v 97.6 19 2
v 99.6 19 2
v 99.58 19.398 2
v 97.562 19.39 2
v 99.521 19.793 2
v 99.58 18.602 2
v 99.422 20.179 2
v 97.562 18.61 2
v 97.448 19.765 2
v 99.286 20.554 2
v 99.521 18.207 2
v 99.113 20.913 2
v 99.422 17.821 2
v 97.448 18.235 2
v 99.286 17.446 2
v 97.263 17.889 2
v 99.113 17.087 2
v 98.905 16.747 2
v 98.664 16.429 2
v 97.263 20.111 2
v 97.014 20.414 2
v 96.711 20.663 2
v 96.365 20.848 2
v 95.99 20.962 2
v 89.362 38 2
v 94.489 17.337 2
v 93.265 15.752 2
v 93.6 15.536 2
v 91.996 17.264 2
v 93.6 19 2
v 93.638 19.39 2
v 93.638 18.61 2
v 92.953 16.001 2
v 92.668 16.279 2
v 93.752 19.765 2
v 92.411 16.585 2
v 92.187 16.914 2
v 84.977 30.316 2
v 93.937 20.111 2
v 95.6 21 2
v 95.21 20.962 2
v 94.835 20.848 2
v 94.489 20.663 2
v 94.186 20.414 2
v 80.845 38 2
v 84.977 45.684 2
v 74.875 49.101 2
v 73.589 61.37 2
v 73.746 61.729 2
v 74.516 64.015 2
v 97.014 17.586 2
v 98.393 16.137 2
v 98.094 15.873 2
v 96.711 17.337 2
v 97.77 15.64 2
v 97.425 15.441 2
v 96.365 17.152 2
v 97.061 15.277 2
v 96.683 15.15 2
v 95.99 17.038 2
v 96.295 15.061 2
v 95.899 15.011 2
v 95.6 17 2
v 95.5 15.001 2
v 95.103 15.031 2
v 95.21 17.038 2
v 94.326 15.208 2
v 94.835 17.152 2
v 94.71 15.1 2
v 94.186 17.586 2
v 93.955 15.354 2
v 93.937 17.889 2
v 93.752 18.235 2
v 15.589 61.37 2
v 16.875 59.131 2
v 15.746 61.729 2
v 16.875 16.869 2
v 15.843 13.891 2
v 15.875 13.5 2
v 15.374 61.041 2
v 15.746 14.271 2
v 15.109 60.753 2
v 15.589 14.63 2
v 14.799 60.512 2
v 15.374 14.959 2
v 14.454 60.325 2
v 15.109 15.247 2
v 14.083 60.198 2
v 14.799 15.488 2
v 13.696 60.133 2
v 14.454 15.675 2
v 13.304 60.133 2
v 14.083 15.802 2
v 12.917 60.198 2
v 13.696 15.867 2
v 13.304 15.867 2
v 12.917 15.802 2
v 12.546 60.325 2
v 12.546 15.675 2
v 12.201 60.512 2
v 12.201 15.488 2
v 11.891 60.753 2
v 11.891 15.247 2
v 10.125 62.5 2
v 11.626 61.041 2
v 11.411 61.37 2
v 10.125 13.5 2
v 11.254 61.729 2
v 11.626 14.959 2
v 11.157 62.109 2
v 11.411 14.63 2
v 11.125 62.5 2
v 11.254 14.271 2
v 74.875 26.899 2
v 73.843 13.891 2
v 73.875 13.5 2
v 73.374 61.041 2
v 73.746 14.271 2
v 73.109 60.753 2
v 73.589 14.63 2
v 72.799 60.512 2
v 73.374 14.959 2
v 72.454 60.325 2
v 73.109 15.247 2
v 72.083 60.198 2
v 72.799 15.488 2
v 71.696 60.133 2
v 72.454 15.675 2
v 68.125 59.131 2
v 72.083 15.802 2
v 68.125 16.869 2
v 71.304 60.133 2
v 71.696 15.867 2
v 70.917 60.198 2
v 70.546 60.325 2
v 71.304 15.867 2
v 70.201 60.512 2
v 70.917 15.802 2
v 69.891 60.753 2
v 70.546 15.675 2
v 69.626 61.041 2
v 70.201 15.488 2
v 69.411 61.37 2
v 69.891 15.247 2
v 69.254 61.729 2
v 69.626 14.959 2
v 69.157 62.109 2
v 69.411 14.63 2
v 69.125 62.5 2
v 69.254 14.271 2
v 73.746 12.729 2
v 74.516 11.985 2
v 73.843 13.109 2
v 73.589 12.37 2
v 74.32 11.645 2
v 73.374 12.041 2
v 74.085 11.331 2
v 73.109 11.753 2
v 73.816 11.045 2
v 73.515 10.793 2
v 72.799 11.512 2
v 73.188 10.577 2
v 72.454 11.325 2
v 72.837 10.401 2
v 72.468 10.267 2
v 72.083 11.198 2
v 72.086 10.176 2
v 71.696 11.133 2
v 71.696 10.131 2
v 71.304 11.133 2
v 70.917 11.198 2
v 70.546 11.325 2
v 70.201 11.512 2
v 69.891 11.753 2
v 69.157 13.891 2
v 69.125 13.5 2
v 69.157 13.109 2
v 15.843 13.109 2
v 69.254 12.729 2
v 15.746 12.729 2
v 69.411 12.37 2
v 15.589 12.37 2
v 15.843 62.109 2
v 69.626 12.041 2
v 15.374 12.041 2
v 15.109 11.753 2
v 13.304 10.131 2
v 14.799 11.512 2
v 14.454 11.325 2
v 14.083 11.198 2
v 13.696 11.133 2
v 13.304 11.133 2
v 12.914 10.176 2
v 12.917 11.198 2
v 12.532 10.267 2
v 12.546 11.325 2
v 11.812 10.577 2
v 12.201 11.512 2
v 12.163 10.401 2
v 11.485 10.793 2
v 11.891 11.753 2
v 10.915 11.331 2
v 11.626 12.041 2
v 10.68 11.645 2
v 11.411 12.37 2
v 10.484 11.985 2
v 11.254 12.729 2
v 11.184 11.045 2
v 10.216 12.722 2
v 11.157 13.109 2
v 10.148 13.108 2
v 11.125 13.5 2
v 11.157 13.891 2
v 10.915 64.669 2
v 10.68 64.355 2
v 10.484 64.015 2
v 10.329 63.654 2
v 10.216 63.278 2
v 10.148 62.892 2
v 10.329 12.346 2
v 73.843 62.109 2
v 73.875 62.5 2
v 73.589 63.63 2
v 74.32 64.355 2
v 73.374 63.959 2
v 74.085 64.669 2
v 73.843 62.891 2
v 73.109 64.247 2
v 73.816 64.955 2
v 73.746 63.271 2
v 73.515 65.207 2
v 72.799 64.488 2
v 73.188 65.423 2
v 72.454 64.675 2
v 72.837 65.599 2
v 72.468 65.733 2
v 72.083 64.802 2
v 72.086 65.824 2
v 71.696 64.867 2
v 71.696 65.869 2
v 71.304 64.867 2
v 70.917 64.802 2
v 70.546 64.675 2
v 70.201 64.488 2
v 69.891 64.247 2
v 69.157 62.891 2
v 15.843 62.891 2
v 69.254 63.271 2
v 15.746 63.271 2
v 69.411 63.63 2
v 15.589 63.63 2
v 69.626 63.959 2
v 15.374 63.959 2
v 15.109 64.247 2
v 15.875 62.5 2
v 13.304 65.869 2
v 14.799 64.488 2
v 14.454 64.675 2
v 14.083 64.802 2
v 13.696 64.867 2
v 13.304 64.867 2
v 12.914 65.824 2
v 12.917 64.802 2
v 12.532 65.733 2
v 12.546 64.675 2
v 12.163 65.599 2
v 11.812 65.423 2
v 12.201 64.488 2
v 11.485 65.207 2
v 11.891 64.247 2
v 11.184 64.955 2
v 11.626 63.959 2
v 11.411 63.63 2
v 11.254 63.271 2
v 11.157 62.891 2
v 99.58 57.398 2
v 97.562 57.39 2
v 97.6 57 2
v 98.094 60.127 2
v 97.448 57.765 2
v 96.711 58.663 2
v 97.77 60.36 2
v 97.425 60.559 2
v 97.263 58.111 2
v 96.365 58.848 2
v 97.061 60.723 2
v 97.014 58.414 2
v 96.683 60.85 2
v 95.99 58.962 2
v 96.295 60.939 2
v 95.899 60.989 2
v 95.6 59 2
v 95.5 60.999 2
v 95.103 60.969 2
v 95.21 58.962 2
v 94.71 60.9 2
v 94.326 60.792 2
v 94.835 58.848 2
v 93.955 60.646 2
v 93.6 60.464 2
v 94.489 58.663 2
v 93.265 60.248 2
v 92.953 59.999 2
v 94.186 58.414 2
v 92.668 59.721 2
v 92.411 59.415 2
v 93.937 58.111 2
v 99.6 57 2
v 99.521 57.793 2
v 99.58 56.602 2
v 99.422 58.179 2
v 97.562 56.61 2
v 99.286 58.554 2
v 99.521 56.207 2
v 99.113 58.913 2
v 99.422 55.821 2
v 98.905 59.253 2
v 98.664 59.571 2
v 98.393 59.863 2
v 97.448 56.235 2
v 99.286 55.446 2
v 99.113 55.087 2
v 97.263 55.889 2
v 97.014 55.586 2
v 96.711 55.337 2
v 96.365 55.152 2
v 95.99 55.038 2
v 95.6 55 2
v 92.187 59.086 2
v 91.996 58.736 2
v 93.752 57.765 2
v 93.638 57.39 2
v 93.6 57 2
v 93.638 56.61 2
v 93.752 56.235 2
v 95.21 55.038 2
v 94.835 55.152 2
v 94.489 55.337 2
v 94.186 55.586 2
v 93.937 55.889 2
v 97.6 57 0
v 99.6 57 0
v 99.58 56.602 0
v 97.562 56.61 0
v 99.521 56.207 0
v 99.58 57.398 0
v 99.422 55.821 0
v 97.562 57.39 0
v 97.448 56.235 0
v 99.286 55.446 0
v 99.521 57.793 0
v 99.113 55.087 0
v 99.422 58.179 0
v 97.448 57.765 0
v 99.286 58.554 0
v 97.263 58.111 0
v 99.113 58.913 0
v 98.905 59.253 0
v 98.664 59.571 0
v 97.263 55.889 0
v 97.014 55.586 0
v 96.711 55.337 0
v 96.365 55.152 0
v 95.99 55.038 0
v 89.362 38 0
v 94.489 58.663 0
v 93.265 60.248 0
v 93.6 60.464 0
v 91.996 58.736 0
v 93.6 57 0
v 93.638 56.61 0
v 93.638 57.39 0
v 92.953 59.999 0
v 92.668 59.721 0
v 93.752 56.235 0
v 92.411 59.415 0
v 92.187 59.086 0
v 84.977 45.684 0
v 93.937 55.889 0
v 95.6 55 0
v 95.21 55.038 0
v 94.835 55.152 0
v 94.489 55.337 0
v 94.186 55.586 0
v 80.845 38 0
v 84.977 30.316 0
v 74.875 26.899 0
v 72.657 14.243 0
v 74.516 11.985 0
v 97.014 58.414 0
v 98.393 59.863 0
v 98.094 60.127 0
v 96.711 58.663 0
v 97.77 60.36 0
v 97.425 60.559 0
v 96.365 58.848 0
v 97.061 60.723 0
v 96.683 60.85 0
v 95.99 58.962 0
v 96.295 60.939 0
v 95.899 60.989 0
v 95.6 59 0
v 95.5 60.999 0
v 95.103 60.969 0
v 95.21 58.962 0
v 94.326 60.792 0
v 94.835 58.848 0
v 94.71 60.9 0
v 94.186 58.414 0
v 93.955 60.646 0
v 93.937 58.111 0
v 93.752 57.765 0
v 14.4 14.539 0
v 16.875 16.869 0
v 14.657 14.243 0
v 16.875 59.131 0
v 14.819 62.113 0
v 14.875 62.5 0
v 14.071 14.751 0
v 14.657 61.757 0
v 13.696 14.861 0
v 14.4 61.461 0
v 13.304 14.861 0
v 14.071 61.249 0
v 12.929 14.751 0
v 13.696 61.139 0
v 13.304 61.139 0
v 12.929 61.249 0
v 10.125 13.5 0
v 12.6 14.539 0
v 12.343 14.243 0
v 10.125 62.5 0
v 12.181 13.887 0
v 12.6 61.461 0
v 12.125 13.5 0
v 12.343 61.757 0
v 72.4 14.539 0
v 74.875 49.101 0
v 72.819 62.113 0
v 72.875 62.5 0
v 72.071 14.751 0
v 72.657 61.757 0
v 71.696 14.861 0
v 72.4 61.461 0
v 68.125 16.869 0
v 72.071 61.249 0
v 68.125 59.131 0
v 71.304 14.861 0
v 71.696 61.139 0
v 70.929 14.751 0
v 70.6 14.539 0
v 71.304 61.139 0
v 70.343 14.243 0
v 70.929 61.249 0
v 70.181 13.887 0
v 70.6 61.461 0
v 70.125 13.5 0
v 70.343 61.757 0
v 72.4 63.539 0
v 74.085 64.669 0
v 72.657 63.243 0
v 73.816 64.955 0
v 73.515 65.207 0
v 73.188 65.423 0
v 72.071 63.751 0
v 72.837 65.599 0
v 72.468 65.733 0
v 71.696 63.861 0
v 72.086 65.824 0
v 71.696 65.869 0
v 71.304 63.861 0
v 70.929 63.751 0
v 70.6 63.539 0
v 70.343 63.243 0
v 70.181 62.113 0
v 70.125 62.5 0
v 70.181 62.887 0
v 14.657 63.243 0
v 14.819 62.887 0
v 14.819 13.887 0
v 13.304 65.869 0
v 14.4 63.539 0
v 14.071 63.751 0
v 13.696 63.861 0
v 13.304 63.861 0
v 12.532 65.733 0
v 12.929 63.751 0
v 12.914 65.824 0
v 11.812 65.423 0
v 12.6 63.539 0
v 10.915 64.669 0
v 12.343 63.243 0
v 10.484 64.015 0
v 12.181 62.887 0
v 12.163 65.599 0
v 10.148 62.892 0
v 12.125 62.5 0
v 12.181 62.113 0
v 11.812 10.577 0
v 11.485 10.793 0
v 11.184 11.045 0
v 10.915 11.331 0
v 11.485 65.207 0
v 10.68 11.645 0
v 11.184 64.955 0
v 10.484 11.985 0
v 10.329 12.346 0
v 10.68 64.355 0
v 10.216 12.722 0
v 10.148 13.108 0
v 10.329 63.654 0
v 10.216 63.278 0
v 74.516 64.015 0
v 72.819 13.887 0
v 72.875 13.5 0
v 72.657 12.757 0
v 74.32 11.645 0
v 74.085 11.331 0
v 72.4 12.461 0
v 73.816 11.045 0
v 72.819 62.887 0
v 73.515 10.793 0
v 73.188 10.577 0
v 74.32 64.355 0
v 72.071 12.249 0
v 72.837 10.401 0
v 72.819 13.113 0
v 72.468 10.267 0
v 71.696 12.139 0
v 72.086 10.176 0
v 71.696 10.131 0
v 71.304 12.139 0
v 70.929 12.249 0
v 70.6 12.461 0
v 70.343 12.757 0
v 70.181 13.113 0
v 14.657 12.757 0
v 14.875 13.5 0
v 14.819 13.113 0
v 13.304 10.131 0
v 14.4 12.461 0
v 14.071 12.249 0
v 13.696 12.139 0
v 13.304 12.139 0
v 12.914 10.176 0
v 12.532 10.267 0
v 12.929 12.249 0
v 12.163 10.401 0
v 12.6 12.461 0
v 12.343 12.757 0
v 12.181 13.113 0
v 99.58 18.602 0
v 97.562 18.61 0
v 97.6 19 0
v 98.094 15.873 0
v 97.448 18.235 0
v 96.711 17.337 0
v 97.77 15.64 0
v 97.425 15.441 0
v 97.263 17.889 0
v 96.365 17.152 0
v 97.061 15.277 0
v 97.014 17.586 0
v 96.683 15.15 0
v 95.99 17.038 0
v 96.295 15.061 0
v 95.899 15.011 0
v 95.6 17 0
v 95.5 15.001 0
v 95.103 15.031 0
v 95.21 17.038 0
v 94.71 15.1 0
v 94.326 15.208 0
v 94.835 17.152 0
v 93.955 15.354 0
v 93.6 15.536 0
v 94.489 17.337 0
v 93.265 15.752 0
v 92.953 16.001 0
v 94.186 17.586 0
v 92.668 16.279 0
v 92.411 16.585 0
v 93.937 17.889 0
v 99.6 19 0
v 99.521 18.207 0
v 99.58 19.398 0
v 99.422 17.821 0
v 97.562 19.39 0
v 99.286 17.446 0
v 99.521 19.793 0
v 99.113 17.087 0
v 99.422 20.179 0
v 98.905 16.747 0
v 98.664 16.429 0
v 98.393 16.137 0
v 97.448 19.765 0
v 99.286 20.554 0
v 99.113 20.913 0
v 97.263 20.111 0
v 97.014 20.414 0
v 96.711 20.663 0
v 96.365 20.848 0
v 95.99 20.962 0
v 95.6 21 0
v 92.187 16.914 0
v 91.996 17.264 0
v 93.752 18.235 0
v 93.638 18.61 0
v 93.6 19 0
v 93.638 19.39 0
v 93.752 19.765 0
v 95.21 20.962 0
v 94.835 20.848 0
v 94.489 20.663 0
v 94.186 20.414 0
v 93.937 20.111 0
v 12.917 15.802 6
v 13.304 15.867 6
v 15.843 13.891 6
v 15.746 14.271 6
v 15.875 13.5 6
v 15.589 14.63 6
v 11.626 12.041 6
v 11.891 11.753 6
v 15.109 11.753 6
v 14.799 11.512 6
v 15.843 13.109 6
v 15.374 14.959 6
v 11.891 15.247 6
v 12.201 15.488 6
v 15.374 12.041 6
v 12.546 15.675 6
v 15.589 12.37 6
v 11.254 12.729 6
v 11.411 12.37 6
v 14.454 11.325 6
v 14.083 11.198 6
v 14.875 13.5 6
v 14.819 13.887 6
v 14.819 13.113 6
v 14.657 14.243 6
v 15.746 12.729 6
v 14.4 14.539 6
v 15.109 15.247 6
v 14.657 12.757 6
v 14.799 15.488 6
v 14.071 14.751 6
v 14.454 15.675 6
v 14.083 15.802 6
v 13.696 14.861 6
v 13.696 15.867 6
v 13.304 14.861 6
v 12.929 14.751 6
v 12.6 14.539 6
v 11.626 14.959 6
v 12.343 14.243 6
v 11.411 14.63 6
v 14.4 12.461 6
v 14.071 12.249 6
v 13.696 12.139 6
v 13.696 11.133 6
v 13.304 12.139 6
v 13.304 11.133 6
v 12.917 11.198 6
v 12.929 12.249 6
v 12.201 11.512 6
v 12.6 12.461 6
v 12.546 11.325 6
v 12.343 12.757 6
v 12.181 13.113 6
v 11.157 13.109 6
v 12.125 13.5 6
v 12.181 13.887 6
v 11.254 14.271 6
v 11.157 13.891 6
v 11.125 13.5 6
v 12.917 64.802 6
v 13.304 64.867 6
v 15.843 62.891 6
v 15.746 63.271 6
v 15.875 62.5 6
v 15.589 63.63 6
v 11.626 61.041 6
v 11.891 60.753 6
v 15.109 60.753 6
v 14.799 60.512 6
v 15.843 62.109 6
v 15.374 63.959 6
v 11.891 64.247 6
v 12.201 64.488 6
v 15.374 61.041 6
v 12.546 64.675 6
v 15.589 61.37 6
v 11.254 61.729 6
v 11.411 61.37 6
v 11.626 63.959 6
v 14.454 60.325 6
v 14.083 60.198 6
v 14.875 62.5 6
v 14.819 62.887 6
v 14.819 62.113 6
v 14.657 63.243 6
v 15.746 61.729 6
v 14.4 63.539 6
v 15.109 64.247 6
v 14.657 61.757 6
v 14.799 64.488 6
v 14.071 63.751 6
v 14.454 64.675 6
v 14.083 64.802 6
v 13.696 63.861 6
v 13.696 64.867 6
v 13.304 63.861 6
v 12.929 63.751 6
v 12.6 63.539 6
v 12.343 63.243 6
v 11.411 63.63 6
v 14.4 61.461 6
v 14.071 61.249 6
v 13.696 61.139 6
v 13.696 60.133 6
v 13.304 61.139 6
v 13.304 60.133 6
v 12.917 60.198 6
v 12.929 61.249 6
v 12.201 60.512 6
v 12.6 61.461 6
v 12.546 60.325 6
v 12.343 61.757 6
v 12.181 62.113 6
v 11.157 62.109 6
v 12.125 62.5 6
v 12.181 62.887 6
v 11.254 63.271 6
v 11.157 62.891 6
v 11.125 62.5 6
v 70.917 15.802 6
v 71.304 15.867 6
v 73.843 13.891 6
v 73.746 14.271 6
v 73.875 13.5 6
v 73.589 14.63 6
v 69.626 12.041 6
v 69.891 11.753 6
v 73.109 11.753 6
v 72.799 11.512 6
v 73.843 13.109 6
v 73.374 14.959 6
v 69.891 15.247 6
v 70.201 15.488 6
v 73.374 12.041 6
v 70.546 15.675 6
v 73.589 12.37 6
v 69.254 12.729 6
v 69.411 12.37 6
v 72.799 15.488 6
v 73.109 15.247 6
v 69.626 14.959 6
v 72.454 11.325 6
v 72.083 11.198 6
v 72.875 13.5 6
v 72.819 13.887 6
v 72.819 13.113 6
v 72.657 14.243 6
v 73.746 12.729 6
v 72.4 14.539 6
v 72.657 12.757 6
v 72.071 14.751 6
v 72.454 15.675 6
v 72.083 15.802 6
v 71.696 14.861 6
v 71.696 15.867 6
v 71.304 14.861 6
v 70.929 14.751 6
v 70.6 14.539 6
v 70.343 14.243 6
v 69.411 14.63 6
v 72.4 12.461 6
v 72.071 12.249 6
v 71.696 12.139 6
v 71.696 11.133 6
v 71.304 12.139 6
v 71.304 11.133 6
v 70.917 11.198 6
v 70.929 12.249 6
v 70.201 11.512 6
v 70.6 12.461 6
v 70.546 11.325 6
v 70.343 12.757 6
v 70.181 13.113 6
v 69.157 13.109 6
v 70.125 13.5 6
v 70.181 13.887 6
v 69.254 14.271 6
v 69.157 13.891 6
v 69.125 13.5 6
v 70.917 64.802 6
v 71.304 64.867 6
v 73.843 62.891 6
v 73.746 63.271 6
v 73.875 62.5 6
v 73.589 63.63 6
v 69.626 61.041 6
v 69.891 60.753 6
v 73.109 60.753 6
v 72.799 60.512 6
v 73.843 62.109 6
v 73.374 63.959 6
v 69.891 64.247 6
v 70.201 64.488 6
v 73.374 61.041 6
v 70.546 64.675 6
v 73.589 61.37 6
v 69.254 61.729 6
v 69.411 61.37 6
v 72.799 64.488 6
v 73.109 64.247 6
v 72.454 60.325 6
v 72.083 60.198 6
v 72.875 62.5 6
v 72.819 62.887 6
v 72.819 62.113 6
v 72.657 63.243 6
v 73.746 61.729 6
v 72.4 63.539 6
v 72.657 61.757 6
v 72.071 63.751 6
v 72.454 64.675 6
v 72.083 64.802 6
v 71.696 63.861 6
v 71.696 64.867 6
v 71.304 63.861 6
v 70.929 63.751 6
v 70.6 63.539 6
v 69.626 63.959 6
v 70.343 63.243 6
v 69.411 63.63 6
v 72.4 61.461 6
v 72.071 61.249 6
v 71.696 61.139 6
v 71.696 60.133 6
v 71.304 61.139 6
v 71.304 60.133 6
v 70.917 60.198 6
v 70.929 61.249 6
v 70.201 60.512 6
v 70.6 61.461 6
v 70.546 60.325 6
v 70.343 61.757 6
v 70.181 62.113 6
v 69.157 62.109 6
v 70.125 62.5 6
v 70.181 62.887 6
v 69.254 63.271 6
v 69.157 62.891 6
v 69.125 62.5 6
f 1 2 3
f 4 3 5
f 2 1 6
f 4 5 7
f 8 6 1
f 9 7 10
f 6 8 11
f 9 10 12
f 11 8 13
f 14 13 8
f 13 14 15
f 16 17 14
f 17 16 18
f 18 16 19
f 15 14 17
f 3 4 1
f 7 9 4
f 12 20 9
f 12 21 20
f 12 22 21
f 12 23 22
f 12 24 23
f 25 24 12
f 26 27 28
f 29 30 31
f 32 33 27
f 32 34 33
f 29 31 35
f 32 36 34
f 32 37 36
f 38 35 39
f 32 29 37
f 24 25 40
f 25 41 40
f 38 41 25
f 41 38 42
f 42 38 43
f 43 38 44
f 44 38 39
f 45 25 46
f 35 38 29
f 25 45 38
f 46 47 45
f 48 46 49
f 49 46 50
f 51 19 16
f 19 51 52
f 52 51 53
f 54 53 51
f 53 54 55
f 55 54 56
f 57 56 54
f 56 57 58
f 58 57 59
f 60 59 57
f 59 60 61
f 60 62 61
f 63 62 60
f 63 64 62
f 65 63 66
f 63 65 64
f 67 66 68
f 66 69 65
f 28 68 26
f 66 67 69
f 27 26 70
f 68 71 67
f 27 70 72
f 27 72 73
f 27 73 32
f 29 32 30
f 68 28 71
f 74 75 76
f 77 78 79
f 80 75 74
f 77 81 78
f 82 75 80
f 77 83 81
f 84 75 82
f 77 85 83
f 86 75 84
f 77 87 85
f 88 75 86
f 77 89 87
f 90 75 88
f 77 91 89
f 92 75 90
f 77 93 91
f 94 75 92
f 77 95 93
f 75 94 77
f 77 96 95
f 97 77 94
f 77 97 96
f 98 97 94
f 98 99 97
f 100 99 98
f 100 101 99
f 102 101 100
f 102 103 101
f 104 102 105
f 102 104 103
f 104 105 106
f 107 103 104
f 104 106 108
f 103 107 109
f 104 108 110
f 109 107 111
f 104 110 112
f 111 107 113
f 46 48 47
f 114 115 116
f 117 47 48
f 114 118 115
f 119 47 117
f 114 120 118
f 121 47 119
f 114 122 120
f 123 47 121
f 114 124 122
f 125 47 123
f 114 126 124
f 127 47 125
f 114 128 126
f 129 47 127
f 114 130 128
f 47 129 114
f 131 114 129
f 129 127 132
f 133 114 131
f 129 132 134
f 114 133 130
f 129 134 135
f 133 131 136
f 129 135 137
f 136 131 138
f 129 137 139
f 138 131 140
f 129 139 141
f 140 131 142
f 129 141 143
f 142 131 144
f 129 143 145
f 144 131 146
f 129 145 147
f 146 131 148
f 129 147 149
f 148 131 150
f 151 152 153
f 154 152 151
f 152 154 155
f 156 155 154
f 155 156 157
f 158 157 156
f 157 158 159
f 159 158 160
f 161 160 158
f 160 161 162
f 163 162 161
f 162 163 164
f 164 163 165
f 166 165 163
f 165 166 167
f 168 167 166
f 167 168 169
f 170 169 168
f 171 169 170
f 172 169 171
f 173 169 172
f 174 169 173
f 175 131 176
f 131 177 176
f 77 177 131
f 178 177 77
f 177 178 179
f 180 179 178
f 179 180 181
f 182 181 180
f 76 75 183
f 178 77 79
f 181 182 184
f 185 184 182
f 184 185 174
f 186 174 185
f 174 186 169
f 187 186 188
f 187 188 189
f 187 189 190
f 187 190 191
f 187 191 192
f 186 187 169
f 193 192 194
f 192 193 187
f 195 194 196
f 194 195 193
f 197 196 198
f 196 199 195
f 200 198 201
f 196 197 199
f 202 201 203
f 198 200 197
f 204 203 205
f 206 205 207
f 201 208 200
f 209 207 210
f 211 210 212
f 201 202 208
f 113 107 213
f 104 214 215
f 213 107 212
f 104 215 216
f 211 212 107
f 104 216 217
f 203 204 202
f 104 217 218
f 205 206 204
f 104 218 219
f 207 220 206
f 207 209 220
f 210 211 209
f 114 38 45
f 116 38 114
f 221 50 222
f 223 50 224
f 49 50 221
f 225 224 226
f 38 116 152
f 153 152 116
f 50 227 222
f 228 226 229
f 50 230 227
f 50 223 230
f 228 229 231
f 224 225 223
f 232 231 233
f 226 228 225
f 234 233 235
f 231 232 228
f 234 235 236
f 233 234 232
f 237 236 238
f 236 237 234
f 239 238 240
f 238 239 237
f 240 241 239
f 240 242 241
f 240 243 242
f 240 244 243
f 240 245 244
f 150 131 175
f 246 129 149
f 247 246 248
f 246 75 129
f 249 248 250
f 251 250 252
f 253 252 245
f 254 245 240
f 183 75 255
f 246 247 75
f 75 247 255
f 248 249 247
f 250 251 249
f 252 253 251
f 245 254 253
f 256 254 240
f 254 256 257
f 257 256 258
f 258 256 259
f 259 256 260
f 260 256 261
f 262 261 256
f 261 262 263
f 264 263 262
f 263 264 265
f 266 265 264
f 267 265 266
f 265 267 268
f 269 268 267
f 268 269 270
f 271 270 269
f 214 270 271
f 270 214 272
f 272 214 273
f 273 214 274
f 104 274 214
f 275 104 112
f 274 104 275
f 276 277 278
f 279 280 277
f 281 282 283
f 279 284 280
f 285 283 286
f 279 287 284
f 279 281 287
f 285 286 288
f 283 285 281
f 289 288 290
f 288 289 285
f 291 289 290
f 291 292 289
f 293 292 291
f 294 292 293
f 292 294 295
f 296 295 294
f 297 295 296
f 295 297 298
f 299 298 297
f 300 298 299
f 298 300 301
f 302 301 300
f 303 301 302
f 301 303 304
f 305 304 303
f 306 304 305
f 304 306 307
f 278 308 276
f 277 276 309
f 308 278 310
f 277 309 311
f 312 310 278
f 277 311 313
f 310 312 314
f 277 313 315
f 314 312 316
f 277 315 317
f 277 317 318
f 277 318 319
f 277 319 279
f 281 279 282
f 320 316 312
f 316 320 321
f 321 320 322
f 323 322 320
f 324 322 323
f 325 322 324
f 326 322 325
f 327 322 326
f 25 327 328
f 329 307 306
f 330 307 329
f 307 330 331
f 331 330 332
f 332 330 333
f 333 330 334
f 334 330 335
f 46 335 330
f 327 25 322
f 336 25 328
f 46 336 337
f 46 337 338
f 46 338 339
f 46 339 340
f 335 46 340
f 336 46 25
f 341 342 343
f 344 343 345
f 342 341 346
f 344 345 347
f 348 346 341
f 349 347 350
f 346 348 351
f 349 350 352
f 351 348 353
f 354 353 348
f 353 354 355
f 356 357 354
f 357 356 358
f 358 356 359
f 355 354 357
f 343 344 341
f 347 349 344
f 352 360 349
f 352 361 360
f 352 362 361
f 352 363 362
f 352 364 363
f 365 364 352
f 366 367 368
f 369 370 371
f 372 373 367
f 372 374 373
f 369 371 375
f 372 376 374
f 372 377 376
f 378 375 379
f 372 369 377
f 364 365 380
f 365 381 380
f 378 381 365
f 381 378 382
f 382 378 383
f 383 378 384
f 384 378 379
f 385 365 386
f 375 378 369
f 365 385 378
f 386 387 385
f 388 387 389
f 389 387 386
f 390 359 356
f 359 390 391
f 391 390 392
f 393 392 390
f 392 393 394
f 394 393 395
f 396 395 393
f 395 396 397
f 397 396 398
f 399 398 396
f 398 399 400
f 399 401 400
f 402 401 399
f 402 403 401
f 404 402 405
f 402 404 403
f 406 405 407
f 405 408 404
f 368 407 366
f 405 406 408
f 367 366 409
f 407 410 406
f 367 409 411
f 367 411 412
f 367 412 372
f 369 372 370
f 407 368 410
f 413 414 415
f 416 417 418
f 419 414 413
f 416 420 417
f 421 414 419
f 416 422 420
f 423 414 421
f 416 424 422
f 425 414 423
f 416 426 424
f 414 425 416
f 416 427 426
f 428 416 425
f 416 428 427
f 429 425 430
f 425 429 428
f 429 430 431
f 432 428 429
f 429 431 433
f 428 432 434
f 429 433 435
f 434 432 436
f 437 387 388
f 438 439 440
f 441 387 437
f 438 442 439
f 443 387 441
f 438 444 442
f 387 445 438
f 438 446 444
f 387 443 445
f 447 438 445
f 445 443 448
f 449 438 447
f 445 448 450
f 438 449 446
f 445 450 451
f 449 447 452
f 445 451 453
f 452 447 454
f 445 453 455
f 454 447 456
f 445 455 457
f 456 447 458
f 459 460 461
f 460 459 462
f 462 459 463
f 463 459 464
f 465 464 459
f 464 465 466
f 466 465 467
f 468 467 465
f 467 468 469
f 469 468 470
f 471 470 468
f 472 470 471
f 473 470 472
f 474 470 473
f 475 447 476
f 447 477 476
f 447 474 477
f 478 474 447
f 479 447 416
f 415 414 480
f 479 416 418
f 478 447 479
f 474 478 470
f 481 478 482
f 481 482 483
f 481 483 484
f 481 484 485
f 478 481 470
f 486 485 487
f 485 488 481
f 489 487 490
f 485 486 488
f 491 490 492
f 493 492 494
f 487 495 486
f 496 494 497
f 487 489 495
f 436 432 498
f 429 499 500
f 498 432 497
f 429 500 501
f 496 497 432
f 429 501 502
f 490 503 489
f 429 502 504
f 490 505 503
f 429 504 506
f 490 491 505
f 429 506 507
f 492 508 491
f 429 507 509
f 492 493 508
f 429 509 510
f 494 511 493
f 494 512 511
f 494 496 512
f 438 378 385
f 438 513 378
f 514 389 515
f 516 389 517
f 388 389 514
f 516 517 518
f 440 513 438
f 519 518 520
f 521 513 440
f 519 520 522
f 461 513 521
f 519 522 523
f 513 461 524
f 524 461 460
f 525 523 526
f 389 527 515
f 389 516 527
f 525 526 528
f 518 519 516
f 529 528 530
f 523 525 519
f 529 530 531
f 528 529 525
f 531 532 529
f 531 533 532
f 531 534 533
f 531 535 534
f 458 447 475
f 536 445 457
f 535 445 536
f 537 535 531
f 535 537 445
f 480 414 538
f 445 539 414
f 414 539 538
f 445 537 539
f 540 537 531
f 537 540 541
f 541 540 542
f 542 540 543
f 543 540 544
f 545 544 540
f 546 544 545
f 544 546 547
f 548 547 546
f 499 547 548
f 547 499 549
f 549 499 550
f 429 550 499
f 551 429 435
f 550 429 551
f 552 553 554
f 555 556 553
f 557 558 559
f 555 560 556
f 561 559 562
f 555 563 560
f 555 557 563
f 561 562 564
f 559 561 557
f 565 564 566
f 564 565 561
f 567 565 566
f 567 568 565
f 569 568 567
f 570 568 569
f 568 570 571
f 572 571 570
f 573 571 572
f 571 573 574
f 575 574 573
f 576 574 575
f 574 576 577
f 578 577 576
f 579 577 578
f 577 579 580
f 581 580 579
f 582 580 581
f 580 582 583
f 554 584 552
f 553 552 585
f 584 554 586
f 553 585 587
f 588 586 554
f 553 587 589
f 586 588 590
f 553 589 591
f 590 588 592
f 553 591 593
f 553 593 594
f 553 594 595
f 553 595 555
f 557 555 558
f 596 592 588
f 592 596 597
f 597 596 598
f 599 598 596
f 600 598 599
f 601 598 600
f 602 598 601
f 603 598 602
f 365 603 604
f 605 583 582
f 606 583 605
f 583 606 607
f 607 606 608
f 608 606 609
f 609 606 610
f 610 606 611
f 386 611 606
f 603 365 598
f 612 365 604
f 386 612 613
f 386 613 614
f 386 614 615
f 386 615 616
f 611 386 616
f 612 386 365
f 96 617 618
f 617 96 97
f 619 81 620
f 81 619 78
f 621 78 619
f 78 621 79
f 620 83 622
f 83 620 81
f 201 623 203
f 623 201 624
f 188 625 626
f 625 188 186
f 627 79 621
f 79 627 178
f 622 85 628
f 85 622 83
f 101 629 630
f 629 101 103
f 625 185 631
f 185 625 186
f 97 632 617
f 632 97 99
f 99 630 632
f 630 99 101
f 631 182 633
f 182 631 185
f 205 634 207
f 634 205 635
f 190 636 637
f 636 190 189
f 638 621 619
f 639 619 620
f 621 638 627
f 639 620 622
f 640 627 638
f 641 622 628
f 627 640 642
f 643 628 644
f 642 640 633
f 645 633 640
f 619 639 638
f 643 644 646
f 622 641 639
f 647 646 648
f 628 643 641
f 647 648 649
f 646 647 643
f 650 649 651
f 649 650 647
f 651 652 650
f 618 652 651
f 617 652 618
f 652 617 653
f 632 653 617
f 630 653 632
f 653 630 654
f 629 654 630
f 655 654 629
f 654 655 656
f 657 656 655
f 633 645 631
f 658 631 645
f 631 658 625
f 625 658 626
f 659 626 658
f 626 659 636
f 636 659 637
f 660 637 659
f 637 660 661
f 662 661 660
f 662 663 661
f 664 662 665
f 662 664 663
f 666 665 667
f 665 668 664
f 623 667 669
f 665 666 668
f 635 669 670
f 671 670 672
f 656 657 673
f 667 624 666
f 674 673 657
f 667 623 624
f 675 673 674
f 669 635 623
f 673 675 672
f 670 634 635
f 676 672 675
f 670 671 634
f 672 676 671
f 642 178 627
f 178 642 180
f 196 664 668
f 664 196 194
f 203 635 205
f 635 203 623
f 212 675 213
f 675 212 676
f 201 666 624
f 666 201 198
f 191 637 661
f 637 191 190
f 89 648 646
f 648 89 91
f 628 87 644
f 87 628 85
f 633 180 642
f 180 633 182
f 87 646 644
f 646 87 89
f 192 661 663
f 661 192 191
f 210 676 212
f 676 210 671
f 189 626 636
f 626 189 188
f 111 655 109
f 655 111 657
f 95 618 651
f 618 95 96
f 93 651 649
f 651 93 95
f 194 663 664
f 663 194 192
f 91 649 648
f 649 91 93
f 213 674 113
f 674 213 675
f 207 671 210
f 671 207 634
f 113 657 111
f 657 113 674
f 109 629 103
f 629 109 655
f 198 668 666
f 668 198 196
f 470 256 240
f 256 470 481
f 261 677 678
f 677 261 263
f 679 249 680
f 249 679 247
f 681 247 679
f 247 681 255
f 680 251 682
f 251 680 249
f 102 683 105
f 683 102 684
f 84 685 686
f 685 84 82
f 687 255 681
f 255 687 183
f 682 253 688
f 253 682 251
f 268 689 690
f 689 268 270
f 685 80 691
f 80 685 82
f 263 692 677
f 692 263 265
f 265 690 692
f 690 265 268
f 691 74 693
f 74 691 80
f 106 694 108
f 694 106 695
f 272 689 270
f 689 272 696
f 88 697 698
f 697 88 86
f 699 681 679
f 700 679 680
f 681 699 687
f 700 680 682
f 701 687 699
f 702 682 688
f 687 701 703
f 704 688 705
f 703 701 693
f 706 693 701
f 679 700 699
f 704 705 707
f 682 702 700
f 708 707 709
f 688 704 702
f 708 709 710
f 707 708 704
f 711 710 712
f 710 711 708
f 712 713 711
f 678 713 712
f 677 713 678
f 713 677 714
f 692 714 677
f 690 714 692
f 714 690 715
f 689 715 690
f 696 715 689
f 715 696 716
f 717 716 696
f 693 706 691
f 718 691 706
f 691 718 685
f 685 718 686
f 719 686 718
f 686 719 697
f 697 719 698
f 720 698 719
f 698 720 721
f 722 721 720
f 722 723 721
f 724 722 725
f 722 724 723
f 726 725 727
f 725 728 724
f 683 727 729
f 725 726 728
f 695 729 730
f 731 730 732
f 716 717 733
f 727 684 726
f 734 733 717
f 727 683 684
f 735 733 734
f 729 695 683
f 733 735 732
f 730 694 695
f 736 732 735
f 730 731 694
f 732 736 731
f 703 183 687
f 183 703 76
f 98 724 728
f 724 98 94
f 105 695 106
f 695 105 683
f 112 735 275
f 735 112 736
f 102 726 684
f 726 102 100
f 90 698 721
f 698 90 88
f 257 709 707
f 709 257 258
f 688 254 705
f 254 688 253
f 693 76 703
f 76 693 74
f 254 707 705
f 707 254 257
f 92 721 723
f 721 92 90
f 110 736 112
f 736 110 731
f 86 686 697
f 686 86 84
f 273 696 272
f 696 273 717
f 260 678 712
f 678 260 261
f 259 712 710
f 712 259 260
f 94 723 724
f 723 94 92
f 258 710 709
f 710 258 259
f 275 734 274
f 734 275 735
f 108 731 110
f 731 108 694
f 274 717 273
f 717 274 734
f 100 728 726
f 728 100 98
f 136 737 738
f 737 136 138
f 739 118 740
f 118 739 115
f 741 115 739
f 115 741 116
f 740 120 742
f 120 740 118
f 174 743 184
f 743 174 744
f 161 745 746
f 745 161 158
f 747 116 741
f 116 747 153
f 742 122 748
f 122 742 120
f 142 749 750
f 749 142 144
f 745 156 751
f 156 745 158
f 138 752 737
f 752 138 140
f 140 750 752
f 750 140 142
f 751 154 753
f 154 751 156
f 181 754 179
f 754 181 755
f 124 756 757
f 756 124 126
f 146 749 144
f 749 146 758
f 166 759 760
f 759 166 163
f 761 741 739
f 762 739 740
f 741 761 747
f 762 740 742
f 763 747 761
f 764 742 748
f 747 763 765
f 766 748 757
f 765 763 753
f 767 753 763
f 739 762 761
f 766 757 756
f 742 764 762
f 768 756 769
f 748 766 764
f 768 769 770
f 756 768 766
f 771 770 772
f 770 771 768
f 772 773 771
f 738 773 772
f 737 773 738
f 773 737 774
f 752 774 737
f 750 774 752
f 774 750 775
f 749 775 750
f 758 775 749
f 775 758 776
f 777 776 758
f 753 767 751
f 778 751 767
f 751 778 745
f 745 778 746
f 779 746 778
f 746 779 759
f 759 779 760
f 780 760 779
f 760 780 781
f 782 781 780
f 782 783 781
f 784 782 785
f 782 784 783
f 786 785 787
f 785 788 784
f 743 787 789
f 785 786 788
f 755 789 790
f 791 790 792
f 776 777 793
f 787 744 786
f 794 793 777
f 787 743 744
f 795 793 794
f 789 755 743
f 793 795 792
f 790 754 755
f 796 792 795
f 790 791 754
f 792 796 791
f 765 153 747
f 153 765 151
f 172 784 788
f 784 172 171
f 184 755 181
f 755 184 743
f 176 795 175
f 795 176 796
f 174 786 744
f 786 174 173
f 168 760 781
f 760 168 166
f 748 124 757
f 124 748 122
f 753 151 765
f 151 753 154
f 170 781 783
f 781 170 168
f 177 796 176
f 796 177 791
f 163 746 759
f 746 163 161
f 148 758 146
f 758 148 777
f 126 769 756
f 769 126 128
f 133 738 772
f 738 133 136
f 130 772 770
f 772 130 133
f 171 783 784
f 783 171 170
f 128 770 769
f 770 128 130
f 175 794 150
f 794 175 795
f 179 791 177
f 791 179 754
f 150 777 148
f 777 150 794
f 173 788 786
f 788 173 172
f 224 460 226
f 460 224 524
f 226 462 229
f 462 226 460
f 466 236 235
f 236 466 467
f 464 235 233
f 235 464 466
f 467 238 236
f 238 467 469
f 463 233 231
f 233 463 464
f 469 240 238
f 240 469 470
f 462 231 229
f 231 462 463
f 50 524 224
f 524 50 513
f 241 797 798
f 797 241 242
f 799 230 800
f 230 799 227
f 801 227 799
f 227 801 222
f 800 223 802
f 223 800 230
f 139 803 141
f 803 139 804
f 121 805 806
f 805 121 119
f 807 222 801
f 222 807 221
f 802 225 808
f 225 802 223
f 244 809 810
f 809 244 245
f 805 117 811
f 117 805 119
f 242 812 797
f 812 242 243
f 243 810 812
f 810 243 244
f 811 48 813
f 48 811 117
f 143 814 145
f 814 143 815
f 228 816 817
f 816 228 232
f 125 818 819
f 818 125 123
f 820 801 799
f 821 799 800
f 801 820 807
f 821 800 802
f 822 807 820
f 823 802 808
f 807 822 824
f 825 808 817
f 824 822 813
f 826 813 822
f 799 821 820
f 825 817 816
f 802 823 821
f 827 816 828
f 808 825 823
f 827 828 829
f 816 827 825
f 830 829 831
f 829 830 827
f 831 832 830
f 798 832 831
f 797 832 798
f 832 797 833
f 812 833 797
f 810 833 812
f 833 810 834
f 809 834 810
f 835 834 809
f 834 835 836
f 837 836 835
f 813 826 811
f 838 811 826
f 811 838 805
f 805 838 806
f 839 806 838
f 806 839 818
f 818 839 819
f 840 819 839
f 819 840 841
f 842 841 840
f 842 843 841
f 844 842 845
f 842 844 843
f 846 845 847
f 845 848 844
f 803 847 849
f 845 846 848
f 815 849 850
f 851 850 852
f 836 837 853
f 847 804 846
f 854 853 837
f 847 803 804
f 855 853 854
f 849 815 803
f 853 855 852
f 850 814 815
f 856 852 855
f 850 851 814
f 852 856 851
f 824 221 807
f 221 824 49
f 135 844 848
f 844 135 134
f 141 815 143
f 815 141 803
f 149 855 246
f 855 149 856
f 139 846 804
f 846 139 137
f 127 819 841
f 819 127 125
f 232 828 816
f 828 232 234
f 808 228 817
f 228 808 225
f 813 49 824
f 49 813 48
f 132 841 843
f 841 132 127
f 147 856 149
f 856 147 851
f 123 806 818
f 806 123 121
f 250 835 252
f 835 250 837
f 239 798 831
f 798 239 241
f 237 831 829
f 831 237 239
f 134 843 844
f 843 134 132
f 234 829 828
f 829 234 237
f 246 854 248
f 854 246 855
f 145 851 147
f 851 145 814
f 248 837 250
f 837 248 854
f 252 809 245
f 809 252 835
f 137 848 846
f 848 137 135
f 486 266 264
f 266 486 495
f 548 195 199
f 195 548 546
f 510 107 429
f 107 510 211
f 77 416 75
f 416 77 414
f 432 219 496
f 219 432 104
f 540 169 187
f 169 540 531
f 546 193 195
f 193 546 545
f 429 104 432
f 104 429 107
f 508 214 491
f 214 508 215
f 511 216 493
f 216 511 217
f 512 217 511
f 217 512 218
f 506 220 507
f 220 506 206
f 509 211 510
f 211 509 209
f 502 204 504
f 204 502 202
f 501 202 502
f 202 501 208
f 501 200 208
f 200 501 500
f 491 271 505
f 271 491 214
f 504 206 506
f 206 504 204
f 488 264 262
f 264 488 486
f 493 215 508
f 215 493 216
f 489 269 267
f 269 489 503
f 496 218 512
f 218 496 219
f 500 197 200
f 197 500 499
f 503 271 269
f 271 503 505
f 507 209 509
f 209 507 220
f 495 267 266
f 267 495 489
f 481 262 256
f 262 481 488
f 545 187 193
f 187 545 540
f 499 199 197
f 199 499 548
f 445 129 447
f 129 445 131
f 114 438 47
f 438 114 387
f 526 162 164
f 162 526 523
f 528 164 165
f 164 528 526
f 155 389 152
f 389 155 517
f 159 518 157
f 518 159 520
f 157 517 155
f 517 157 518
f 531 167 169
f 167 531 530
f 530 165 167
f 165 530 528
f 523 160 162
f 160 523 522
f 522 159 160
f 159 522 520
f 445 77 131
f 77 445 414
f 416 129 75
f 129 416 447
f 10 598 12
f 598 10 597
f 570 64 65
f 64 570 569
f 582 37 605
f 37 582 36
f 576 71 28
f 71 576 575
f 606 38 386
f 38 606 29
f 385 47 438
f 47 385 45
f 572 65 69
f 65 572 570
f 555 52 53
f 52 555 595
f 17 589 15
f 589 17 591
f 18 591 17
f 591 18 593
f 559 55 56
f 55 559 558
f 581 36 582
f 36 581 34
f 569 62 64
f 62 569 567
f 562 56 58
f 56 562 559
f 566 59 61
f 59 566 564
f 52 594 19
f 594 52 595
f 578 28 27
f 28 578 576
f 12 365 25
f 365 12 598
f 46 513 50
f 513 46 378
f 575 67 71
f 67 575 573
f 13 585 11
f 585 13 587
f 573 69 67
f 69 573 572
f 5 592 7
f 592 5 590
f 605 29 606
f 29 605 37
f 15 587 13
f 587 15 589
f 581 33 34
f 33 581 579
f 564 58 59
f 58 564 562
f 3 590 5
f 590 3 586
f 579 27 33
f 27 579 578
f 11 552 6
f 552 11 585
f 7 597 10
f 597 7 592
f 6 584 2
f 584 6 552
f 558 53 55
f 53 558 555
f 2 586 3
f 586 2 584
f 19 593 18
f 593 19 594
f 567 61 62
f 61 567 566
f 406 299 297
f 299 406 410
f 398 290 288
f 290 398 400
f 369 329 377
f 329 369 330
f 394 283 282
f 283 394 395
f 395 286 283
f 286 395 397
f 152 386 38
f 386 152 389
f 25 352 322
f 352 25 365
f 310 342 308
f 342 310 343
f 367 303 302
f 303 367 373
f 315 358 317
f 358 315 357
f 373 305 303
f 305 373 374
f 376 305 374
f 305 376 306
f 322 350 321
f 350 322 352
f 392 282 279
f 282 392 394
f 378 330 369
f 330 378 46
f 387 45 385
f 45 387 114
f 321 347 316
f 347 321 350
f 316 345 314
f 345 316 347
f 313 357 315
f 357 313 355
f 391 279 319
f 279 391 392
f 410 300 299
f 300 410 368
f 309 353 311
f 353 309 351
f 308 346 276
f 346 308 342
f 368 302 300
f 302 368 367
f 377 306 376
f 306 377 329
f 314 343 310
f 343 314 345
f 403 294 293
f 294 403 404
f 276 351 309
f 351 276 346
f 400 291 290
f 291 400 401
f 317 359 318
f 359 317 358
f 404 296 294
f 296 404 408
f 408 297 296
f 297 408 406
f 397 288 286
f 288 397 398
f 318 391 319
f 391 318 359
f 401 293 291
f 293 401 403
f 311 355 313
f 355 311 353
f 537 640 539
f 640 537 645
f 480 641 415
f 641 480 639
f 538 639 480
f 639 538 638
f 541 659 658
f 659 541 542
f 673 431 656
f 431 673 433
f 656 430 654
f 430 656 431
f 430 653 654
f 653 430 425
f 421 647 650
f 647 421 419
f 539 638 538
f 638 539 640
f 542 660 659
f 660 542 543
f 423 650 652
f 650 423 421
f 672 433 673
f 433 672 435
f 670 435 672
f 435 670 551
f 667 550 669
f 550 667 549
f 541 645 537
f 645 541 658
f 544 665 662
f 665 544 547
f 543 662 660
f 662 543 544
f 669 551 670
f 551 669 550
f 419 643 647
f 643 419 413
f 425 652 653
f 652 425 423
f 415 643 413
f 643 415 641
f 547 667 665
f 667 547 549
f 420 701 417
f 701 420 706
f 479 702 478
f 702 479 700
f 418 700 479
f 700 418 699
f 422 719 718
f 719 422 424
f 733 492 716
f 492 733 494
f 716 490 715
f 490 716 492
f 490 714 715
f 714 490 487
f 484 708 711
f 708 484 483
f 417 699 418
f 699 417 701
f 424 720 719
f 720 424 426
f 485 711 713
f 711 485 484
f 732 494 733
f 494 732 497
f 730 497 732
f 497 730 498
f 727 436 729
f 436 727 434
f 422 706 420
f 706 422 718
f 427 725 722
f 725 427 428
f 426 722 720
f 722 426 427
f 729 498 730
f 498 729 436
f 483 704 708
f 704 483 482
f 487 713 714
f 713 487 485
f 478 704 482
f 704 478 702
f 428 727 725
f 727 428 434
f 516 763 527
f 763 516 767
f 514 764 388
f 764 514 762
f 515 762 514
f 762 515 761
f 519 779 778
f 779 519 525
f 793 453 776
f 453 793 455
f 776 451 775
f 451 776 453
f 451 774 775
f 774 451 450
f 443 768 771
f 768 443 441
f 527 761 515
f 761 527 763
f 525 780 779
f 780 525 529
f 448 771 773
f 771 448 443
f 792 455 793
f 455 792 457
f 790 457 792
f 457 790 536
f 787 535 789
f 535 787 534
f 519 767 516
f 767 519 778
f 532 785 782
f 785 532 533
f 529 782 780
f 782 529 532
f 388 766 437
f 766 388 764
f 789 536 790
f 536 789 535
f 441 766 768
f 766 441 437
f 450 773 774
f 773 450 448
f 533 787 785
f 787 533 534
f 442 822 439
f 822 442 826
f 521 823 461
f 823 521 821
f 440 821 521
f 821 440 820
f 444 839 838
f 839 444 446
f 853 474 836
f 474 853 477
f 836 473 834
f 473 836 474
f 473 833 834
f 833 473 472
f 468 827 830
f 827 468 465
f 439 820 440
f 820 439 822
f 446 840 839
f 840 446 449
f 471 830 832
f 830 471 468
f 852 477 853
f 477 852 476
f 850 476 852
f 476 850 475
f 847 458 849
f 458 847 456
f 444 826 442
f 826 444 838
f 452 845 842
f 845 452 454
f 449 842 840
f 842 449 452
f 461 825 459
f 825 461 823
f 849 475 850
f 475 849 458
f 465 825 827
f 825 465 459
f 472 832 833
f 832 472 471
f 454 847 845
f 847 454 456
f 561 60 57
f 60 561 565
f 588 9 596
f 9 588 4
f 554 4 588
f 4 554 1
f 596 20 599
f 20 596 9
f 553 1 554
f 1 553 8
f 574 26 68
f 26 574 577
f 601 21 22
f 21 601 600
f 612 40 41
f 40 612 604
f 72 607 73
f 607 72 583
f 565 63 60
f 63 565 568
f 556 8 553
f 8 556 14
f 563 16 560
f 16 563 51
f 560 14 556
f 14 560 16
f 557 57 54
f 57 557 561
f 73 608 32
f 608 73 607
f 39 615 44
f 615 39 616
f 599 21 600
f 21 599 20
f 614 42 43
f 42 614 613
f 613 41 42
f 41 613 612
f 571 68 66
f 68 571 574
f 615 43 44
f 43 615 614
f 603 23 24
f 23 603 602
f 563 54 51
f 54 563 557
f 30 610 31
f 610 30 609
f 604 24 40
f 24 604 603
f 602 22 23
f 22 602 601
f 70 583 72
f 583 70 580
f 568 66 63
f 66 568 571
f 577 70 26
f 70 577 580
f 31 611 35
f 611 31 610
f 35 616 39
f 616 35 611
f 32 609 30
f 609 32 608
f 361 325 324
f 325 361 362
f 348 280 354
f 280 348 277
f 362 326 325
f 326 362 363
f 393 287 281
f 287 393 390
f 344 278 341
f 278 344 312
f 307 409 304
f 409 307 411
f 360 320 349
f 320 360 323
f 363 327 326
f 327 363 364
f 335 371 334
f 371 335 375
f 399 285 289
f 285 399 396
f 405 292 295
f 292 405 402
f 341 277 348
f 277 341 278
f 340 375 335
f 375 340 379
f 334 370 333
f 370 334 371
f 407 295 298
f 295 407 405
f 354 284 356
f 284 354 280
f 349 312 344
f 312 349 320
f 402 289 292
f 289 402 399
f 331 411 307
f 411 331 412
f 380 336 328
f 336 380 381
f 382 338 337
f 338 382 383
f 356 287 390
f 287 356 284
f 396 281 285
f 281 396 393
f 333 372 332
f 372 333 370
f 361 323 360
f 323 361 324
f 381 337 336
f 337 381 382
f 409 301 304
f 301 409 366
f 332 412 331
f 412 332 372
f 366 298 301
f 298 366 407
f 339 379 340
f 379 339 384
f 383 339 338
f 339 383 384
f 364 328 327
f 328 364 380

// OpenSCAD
$fa = 1;
$fs = 0.4;

// Board dimensions
board_thickness = 2;

// Pi 4 dimensions (85.6mm x 56mm)
pi4_width_padding = 10;
pi4_width = 85.6;
pi4_height_padding = 10;
pi4_height = 56;
pi4_mount_hole_dia = 2.75;
pi4_mount_hole_lip_height = 4; // pi5s for now
pi4_mount_hole_lip_thickness = 1;
pi4_mount_hole_positions = [
    [3.5, 3.5],
    [3.5, 52.5],
    [61.5, 3.5],
    [61.5, 52.5]
];

// Pi 5 dimensions (85mm x 56mm)
pi5_width_padding = 10;
pi5_width = 85;
pi5_height_padding = 10;
pi5_height = 56;
pi5_mount_hole_dia = 2.75;
pi5_mount_hole_lip_height = 1;
pi5_mount_hole_lip_thickness = 1;
pi5_mount_hole_positions = [
    [3.5, 3.5],
    [3.5, 52.5],
    [61.5, 3.5],
    [61.5, 52.5]
];

hanging_hole_dia = 4;
// how far should the holes be from the edge of the board and the pis
hole_padding = 10;

board_width = 2*pi4_width_padding + pi4_width + 2*hole_padding + 2*pi5_width_padding + pi5_width;
board_height = 2*pi4_height_padding + pi4_height + 2*hole_padding + 2*pi5_height_padding + pi5_height;

single_board_width = 2*pi4_width_padding + pi4_width;
single_board_height = 2*pi4_height_padding + pi4_height;

// // Main board
// difference() {
//     // Base board
//     cube([board_width, board_height, board_thickness]);

//     // Pi 4 mounting holes
//     translate([hole_padding, hole_padding, 0])
//     for(pos = pi4_mount_hole_positions) {
//         translate([pos[0], pos[1], -0.1])
//         cylinder(d=pi4_mount_hole_dia, h=board_thickness + 0.2);
//     }

//     // Pi 5 mounting holes
    

    
//     // keeping this for later
//     // // Pi 4 mounting holes
//     // translate([(board_width/2 - pi4_width/2), (board_height/2 - pi4_height/2 - 10), 0])
//     // for(pos = pi4_mount_hole_positions) {
//     //     translate([pos[0], pos[1], -0.1])
//     //     cylinder(d=pi4_mount_hole_dia, h=board_thickness + 0.2);
//     // }
    
//     // // Pi 5 mounting holes
//     // translate([(board_width/2 - pi5_width/2), (board_height/2 + pi5_height/2 + 10), 0])
//     // for(pos = pi5_mount_hole_positions) {
//     //     translate([pos[0], pos[1], -0.1])
//     //     cylinder(d=pi5_mount_hole_dia, h=board_thickness + 0.2);
//     // }
    
//     // // // Wall mount holes
//     // for(pos = wall_mount_hole_positions) {
//     //     translate([pos[0], pos[1], -0.1])
//     //     cylinder(d=wall_mount_hole_dia, h=board_thickness + 0.2);
//     // }
// }

// single board mount
difference() {
    // Create a minimal frame connecting the mounting points
    union() {
        // Frame around Pi4 mounting holes
        translate([pi4_width_padding, pi4_height_padding, 0]) {
            for(pos = pi4_mount_hole_positions) {
                translate([pos[0], pos[1], 0]) {
                    // Base cylinder
                    cylinder(d=pi4_mount_hole_dia + 4, h=board_thickness);
                    // Add lip on top
                    translate([0, 0, board_thickness])
                    cylinder(d=pi4_mount_hole_dia + 2*pi4_mount_hole_lip_thickness, h=pi4_mount_hole_lip_height);
                }
            }
            // Connect holes with thin strips
            hull() {
                translate([pi4_mount_hole_positions[0][0], pi4_mount_hole_positions[0][1], 0])
                cylinder(d=pi4_mount_hole_dia + 4, h=board_thickness);
                translate([pi4_mount_hole_positions[1][0], pi4_mount_hole_positions[1][1], 0])
                cylinder(d=pi4_mount_hole_dia + 4, h=board_thickness);
            }
            hull() {
                translate([pi4_mount_hole_positions[2][0], pi4_mount_hole_positions[2][1], 0])
                cylinder(d=pi4_mount_hole_dia + 4, h=board_thickness);
                translate([pi4_mount_hole_positions[3][0], pi4_mount_hole_positions[3][1], 0])
                cylinder(d=pi4_mount_hole_dia + 4, h=board_thickness);
            }
            hull() {
                translate([pi4_mount_hole_positions[0][0], pi4_mount_hole_positions[0][1], 0])
                cylinder(d=pi4_mount_hole_dia + 4, h=board_thickness);
                translate([pi4_mount_hole_positions[2][0], pi4_mount_hole_positions[2][1], 0])
                cylinder(d=pi4_mount_hole_dia + 4, h=board_thickness);
            }
            hull() {
                translate([pi4_mount_hole_positions[1][0], pi4_mount_hole_positions[1][1], 0])
                cylinder(d=pi4_mount_hole_dia + 4, h=board_thickness);
                translate([pi4_mount_hole_positions[3][0], pi4_mount_hole_positions[3][1], 0])
                cylinder(d=pi4_mount_hole_dia + 4, h=board_thickness);
            }
        }
        // Connect to two hanging holes
        hull() {
            translate([pi4_width_padding + pi4_mount_hole_positions[3][0], pi4_height_padding + pi4_mount_hole_positions[3][1], 0])
            cylinder(d=pi4_mount_hole_dia + 4, h=board_thickness);
            translate([pi4_width_padding + pi4_width, single_board_height / 4, 0])
            cylinder(d=hanging_hole_dia + 4, h=board_thickness);
        }
        hull() {
            translate([pi4_width_padding + pi4_mount_hole_positions[2][0], pi4_height_padding + pi4_mount_hole_positions[2][1], 0])
            cylinder(d=pi4_mount_hole_dia + 4, h=board_thickness);
            translate([pi4_width_padding + pi4_width, 3 * single_board_height / 4, 0])
            cylinder(d=hanging_hole_dia + 4, h=board_thickness);
        }
    }
    
    // Cut out the mounting holes
    translate([pi4_width_padding, pi4_height_padding, 0]) {
        for(pos = pi4_mount_hole_positions) {
            translate([pos[0], pos[1], -0.1])
            cylinder(d=pi4_mount_hole_dia, h=board_thickness + pi4_mount_hole_lip_height + 0.3);
        }
    }

    // Cut out two hanging holes
    translate([pi4_width_padding + pi4_width, single_board_height / 4, -0.1]) {
        cylinder(d=hanging_hole_dia, h=board_thickness + 0.2);
    }
    translate([pi4_width_padding + pi4_width, 3 * single_board_height / 4, -0.1]) {
        cylinder(d=hanging_hole_dia, h=board_thickness + 0.2);
    }
}
